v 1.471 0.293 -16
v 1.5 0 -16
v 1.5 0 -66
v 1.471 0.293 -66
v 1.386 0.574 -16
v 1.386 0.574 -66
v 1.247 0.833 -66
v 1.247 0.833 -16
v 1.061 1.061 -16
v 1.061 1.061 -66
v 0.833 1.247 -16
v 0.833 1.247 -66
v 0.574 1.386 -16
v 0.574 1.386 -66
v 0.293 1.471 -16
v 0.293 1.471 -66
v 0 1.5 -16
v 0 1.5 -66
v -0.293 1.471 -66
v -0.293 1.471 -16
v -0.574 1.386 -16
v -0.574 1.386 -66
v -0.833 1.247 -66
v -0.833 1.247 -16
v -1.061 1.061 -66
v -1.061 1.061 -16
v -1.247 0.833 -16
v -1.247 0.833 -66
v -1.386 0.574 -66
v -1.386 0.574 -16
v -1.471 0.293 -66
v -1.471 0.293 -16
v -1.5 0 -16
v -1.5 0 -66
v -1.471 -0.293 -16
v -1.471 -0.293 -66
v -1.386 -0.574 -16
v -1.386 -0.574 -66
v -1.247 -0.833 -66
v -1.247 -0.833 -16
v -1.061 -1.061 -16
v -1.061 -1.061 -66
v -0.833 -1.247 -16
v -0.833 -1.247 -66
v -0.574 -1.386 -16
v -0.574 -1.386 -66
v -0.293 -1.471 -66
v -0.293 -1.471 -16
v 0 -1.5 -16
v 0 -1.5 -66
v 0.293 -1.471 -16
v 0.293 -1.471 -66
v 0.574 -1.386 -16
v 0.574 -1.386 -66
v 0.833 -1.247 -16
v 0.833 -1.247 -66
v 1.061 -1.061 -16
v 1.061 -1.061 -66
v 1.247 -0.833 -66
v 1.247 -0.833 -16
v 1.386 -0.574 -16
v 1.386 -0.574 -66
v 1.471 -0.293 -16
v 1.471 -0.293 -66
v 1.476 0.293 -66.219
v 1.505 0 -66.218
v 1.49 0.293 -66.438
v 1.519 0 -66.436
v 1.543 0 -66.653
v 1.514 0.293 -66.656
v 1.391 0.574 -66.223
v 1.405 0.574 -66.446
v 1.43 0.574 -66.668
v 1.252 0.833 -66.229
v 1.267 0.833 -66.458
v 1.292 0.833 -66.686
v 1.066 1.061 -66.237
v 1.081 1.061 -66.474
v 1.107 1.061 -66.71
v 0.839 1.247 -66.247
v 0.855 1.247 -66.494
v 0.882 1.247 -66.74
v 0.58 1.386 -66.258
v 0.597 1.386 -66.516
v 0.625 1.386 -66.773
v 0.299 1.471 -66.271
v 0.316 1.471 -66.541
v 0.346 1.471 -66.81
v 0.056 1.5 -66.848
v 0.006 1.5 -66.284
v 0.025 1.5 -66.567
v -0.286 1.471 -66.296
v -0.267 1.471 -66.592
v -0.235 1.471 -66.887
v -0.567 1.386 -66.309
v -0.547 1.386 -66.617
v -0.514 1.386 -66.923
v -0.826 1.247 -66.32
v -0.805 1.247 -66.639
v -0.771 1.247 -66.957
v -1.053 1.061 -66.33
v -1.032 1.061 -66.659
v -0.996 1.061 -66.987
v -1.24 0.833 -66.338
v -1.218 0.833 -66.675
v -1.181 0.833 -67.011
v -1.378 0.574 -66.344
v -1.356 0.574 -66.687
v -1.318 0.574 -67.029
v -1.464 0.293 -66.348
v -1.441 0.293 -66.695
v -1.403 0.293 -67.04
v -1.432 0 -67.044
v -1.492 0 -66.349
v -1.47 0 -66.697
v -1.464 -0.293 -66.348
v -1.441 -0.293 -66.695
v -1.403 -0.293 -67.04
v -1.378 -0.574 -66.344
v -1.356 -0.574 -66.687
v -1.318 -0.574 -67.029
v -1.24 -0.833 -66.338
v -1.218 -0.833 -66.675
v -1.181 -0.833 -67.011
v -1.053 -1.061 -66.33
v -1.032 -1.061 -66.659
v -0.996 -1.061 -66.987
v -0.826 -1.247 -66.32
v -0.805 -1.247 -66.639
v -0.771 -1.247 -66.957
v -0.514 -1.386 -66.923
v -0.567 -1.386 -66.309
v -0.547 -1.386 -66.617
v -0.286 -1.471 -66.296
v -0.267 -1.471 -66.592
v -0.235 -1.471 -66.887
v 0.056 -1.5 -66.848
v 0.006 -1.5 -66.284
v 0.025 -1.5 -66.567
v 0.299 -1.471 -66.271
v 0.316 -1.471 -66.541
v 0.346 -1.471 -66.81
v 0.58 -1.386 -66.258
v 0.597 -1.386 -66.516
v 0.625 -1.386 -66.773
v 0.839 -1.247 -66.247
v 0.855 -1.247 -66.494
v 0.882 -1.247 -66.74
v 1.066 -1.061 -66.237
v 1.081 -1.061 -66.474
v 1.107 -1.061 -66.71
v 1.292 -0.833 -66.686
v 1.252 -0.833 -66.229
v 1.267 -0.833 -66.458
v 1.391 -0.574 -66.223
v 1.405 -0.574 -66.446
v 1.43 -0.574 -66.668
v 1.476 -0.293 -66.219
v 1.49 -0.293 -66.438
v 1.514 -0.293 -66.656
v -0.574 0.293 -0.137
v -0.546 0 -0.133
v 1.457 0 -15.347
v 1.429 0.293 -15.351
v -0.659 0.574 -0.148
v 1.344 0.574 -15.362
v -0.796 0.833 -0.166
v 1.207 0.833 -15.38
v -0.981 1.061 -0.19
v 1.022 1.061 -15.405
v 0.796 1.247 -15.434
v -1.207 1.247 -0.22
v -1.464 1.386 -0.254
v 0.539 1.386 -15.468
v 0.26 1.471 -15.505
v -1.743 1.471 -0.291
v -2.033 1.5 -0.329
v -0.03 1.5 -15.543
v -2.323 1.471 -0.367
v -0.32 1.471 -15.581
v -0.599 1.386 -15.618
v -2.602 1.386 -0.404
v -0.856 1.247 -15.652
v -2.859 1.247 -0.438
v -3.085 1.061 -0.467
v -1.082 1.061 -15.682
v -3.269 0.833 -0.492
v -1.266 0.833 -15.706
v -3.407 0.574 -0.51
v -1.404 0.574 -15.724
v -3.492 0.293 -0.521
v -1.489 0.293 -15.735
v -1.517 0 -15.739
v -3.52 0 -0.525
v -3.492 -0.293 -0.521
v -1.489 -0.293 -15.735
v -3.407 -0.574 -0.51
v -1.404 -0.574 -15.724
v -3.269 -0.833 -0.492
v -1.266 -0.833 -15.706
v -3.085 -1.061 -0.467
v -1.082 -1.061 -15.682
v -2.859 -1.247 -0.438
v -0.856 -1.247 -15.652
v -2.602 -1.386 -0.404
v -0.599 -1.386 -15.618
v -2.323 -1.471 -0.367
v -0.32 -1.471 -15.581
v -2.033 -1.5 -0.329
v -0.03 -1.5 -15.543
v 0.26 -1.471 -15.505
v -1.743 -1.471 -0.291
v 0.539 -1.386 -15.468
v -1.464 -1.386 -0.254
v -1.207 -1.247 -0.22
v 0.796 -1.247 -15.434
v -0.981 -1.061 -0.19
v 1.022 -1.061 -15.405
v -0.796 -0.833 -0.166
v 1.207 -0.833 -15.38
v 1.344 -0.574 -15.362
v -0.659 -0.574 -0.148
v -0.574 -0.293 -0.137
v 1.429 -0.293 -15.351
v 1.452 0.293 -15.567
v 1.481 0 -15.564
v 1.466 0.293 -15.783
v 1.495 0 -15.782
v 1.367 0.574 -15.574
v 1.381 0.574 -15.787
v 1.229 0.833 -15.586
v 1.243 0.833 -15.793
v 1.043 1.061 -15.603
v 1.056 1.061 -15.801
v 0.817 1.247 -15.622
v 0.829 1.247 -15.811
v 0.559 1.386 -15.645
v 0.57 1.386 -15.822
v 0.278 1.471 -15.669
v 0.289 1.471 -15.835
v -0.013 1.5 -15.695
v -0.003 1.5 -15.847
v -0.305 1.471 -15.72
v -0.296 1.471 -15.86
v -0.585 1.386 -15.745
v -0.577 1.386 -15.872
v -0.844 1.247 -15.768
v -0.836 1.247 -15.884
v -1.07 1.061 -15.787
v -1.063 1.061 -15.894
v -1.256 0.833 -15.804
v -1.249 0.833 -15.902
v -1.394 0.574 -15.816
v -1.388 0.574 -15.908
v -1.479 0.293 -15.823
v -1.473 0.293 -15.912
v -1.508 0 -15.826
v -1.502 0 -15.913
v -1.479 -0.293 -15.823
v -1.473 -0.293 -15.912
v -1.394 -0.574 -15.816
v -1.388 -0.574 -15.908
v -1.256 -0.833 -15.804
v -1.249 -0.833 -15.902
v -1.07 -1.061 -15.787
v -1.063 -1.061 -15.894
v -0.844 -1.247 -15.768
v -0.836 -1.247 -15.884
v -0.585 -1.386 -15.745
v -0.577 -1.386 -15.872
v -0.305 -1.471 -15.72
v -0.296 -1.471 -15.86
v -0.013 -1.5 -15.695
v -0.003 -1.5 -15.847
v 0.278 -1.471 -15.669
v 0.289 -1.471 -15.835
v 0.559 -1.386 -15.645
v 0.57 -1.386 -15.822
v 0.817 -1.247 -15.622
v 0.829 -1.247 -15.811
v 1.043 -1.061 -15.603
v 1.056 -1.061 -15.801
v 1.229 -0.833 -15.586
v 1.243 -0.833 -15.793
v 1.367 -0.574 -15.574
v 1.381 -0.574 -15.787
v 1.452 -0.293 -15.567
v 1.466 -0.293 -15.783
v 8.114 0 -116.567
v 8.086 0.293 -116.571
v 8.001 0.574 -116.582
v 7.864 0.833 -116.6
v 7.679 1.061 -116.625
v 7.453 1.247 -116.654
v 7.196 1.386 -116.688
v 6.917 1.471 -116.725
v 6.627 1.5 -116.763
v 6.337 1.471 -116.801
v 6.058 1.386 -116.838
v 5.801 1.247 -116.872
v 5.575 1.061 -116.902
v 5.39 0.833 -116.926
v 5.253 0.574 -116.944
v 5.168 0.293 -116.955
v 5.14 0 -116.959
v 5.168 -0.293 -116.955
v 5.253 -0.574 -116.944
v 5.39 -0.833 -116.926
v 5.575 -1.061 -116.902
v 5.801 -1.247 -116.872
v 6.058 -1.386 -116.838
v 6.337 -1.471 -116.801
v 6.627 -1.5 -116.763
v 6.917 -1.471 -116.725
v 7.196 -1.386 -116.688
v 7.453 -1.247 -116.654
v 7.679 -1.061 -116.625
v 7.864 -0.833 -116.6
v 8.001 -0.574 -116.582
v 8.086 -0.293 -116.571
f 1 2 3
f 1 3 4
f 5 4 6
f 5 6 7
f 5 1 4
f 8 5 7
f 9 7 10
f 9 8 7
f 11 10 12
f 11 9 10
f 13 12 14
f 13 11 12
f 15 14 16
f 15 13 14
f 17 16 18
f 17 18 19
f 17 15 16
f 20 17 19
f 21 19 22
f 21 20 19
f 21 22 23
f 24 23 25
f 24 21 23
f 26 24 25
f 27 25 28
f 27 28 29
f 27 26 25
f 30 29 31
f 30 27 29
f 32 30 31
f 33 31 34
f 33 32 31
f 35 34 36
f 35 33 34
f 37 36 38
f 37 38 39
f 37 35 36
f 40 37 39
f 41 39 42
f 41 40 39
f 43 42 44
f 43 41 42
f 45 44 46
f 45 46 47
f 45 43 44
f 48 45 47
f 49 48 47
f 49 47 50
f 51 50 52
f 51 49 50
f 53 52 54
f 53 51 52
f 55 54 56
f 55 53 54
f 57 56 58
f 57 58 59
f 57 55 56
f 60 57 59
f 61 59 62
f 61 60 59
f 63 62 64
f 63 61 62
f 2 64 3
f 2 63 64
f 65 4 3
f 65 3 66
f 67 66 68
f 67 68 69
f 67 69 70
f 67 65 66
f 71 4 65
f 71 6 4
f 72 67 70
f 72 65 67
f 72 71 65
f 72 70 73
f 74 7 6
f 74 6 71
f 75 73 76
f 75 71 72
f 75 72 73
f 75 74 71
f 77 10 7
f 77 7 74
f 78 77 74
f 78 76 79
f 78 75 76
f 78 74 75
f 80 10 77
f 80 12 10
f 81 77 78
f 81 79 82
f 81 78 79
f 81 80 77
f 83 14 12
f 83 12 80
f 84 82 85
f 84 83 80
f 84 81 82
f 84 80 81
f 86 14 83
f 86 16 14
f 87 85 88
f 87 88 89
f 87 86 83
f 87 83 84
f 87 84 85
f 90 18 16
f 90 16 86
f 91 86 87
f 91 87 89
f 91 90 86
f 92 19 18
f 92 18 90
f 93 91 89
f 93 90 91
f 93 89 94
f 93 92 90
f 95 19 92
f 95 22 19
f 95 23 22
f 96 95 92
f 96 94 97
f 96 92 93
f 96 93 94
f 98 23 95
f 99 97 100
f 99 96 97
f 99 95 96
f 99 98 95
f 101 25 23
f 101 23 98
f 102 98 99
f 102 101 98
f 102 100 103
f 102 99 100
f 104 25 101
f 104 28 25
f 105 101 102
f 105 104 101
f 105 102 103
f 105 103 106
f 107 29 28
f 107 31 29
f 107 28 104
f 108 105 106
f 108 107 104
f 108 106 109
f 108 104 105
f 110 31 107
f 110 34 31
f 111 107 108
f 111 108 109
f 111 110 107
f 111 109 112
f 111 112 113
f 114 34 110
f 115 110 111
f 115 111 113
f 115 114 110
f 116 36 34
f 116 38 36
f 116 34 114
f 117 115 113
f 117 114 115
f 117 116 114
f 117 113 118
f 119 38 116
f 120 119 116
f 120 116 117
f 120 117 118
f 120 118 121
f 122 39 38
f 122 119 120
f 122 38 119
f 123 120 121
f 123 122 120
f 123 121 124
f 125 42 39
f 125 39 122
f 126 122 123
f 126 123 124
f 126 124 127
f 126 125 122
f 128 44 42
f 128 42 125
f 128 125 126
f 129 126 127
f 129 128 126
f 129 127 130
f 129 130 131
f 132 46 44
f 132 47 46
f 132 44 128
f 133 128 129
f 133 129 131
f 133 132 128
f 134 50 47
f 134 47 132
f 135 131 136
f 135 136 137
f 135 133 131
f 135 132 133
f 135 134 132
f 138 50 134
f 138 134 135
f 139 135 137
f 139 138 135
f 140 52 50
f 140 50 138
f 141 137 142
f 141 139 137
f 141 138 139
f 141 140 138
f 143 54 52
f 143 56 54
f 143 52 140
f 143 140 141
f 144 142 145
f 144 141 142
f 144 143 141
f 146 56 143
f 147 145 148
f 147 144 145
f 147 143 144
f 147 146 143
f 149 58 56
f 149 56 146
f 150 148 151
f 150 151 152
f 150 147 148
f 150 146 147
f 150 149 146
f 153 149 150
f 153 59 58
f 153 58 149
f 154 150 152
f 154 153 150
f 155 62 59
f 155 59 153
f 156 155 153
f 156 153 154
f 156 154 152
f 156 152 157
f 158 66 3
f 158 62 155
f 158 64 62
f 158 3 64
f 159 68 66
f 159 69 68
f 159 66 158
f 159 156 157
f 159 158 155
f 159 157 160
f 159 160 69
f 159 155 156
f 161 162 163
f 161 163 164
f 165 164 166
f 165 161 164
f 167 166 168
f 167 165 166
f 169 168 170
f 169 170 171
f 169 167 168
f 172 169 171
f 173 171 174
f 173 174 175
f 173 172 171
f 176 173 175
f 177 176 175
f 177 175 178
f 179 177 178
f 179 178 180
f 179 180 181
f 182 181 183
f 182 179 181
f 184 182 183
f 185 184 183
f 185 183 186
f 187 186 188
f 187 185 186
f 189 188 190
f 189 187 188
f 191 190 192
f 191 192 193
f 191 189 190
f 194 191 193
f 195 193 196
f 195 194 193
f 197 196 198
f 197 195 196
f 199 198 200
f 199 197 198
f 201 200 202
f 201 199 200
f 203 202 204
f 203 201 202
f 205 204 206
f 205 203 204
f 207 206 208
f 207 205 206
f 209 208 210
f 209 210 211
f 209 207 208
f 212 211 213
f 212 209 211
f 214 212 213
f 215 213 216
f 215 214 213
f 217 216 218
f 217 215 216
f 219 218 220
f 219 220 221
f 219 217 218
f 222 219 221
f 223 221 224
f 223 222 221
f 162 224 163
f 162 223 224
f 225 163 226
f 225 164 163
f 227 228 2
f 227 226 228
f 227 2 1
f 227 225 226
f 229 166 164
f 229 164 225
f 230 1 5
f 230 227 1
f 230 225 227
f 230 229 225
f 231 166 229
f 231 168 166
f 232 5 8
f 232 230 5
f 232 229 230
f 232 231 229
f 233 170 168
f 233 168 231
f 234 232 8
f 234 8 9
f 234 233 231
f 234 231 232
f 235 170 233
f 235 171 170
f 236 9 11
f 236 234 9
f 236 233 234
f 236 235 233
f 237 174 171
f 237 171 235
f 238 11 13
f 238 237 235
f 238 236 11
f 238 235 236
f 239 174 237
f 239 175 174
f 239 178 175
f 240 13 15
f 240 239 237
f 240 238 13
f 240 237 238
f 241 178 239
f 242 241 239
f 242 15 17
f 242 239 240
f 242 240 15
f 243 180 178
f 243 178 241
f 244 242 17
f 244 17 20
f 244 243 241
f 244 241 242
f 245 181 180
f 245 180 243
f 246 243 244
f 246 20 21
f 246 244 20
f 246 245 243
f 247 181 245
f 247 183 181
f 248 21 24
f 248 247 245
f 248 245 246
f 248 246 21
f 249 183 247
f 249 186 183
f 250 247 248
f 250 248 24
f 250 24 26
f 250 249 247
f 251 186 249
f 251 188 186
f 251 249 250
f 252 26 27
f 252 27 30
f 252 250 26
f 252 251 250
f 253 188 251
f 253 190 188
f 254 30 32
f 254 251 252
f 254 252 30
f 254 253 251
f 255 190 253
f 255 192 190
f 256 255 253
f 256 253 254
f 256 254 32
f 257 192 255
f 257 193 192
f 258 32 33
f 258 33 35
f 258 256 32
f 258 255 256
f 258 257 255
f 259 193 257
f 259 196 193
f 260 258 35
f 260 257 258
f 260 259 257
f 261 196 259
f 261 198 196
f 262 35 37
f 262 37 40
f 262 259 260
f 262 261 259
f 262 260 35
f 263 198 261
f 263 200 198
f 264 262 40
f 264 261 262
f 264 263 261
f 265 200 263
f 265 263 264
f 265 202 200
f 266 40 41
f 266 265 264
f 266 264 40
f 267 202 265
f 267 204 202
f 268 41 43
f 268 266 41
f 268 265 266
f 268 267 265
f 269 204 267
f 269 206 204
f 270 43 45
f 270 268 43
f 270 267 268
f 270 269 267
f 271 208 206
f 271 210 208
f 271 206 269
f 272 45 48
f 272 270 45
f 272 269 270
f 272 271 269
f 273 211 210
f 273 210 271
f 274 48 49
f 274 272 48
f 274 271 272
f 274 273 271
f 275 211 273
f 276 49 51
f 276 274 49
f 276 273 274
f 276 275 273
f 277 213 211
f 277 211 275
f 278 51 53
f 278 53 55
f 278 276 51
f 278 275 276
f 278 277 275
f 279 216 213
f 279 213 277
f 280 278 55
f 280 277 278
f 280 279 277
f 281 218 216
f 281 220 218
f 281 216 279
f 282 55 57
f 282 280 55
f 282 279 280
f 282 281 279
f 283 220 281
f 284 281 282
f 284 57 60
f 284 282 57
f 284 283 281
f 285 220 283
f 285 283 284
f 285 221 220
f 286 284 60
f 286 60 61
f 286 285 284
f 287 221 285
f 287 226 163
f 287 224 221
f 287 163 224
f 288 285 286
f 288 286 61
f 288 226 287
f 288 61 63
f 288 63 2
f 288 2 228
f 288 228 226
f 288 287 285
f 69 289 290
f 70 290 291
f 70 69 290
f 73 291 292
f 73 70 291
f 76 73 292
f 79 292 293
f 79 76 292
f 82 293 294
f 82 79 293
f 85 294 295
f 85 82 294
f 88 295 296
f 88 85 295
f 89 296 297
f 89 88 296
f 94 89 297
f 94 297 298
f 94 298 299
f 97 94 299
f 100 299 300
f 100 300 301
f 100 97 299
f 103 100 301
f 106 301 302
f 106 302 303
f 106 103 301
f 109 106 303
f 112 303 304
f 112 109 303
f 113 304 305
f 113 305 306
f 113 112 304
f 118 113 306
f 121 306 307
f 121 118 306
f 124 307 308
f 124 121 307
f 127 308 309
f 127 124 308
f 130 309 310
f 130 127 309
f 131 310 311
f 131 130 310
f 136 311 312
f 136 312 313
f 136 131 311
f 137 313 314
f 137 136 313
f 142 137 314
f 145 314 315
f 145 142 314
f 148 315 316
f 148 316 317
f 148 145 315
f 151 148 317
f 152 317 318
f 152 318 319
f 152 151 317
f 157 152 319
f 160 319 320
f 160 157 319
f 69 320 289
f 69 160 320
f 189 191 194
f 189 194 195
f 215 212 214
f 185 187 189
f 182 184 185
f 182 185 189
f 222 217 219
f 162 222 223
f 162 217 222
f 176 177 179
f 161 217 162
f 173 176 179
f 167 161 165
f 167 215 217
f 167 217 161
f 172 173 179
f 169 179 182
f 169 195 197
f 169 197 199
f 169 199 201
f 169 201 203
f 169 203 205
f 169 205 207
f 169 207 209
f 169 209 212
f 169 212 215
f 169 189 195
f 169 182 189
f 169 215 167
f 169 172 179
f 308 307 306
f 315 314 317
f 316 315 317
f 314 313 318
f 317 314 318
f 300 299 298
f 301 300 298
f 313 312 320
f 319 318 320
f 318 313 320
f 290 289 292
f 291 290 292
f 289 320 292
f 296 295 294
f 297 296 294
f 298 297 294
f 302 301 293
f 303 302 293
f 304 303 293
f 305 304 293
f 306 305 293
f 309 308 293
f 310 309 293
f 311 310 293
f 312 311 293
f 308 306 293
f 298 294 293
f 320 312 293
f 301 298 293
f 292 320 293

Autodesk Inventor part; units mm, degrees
ref_plane "XZ Plane" through (0, 0, 0) normal (0, 1, 0) x (-1, 0, 0)
ref_plane "XY Plane" through (0, 0, 0) normal (0, 0, 1) x (1, 0, 0)
sketch "Sketch1" plane through (0, 0, 0) normal (0, 0, 1) x (1, 0, 0)
  circle A0 centre (0, 0) radius 1.5
  dimension "d0" = 3
extrude "Extrusion1" add sketch "Sketch1" against normal blind 117
ref_plane "Work Plane1" through (1.5, 0, 0) normal (1, 0, 0) x (0, 1, 0)
sketch "Sketch2" plane through (1.5, 0, 0) normal (1, 0, 0) x (0, 1, 0)
  line L0 (1.5, 0) -> (1.5, -117) projected
  line L1 (1.5, 0) -> (-1.5, 0)
  line L2 (-1.5, 0) -> (-1.5, -117) projected
  line L3 (1.5, -16) -> (-1.5, -16)
  line L4 (1.5, -66) -> (-1.5, -66)
  line L5 (-1.5, -66) -> (1.5, -66)
  point P0 (0, 0)
  dimension "d4" = 0
  dimension "d5" = 16
  dimension "d6" = 50
  dimension "d17" = 0
  dimension "d18" = 0
  dimension "d19" = 3
  dimension "d20" = 3
bend part "Bend Part1" radius 5 angle 7.5 line through (1.5, -1.5, -66) along (0, 1, 0) centre toward (1, 0, 0) moving side (0, 0, -1) both sides no
sketch "Sketch3" plane through (1.5, 0, 0) normal (1, 0, 0) x (0, 1, 0)
  line L0 (-1.5, -66) -> (1.5, -66) projected
  line L1 (1.5, -66) -> (-1.5, -66)
  line L2 (-1.5, -66) -> (-1.5, -66.8484) projected
  line L3 (2.4329, -66) -> (-2.7481, -66)
  line L4 (2.4329, -16) -> (-2.7481, -16)
  point P0 (0, 0)
  dimension "d9" = 50
  dimension "d12" = 50
  dimension "d13" = 3.9329
  dimension "d14" = 3.9329
  dimension "d15" = 1.2481
  dimension "d16" = 1.2481
bend part "Bend Part2" radius 5 angle 7.5 line through (1.5, 2.4329, -16) along (0, -1, 0) centre toward (-1, 0, 0) moving side (0, 0, 1) both sides no
thread "Thread1" size "M3x0.5" class "6g" standard "ANSI Metric M Profile" length 4
properties part number "32 - Eccentric Disk Rod" material "Steel AISI 1020 107 HR"
